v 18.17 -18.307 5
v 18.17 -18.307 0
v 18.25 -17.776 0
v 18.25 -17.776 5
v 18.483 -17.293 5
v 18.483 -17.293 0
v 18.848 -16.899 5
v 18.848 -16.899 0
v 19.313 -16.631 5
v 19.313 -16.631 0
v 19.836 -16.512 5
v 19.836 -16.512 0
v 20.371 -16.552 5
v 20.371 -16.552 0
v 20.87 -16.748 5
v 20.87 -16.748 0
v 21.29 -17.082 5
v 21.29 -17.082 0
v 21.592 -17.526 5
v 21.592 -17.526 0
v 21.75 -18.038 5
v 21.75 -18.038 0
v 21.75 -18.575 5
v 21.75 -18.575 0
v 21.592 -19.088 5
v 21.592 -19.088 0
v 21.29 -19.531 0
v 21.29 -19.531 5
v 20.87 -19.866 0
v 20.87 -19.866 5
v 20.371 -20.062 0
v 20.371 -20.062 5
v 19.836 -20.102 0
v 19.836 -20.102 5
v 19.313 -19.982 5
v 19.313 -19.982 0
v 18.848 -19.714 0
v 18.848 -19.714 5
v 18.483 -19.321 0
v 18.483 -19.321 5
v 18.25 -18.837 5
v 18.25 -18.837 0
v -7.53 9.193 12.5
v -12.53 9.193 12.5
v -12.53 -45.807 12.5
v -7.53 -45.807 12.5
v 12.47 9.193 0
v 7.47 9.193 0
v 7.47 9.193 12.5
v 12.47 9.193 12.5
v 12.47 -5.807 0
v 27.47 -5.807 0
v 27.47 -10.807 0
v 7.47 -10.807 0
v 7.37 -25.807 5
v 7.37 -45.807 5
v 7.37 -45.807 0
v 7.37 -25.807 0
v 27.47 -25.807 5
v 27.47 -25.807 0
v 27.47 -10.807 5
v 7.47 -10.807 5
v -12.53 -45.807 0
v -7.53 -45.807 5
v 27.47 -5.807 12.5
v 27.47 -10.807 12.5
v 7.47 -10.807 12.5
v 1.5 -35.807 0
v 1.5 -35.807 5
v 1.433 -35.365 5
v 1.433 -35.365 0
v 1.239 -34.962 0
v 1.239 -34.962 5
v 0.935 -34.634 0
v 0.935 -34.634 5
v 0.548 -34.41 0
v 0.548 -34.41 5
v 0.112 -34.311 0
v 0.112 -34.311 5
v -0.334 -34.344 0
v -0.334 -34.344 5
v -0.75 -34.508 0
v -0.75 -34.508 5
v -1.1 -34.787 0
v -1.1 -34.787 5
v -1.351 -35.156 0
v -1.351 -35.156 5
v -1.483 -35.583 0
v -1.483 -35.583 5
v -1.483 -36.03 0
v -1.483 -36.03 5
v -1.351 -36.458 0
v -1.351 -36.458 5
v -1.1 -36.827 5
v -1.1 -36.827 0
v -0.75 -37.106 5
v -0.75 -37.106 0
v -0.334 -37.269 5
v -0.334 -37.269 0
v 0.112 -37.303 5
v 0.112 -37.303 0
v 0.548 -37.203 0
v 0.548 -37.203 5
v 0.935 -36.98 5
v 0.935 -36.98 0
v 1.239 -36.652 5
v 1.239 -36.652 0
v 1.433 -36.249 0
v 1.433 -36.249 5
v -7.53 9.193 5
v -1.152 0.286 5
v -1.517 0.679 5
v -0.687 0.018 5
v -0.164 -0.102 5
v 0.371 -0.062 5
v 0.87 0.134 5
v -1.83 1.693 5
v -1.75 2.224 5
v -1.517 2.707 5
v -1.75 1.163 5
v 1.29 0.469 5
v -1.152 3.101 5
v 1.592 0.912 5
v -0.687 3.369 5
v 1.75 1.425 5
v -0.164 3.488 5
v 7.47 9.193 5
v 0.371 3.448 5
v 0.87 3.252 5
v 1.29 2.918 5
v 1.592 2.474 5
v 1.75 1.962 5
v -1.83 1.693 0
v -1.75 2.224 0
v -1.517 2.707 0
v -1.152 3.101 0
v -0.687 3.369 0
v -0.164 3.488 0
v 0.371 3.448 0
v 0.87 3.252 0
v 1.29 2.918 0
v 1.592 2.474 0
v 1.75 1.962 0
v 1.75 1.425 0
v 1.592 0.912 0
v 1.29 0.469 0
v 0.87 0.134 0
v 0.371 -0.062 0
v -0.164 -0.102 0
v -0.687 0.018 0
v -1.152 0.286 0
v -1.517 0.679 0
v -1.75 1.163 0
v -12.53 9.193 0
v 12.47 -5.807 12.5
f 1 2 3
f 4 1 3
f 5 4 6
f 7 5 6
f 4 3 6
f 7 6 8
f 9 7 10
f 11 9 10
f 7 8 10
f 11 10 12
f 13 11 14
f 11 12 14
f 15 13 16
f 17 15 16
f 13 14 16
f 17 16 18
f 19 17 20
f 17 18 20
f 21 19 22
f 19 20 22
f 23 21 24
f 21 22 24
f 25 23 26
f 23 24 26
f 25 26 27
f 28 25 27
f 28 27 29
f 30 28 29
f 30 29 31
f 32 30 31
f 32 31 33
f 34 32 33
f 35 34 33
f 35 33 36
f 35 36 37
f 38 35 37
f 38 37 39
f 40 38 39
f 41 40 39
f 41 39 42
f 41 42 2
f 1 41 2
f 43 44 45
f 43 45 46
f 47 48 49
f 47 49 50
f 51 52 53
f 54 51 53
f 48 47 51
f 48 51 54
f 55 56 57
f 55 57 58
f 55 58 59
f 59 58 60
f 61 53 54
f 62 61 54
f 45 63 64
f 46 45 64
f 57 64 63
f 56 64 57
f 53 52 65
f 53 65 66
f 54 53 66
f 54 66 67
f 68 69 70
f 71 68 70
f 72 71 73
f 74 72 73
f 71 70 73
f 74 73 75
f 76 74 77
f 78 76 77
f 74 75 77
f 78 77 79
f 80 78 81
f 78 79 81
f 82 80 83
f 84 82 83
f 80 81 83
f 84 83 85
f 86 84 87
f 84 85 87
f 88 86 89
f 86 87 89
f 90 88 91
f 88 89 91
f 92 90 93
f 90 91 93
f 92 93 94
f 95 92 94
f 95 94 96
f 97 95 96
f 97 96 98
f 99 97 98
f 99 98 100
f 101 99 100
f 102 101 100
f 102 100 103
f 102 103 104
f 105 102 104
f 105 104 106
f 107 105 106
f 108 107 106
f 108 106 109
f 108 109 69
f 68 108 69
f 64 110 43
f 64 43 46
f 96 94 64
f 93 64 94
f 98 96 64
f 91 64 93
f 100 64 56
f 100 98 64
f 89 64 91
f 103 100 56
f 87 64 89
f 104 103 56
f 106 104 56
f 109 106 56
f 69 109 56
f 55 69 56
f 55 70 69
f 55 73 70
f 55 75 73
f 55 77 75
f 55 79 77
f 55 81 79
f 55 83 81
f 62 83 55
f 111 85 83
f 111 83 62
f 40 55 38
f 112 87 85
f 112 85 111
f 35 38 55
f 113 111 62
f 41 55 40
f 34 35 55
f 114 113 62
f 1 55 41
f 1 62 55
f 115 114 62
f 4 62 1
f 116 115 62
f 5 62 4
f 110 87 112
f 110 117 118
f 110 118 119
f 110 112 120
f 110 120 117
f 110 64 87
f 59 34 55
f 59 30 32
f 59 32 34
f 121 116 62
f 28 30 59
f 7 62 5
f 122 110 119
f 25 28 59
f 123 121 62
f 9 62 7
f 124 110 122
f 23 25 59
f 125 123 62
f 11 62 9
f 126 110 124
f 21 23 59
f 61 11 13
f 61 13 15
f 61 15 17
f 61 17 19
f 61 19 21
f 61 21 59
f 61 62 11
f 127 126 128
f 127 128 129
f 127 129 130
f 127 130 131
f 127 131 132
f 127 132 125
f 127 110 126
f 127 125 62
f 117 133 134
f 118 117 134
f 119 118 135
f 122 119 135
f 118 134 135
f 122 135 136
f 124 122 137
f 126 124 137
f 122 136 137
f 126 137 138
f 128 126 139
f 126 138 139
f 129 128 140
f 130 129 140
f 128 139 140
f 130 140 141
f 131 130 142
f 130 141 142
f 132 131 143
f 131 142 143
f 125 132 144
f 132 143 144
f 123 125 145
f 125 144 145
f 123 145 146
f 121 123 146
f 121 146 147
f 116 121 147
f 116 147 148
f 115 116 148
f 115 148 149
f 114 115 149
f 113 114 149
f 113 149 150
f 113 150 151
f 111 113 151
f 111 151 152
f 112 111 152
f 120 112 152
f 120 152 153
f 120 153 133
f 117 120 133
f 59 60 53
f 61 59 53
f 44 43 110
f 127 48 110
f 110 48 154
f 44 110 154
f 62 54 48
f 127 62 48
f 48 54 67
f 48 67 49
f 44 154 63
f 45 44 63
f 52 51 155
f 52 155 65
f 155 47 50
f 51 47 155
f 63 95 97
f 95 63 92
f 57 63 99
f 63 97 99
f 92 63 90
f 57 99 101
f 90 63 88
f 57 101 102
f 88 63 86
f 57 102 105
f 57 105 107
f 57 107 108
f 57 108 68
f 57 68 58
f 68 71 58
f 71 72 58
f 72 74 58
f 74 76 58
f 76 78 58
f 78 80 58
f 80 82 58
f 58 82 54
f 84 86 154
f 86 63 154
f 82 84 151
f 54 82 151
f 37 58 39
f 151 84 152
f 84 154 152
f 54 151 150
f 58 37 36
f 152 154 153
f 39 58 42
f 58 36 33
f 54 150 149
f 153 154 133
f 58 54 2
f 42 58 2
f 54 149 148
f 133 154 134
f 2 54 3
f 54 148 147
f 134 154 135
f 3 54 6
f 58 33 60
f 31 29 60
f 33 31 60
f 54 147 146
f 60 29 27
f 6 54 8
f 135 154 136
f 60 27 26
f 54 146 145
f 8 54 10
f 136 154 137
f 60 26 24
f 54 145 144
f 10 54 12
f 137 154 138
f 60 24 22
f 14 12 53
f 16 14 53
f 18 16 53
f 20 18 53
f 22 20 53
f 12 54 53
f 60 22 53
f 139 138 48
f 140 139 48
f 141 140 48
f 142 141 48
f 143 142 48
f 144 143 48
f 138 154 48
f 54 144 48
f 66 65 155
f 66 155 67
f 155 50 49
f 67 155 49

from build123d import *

# Parameters (mm, degrees)
BOSS_EXTRUDE1_DEPTH = 5
BOSS_EXTRUDE2_DEPTH = 12.5
BOSS_EXTRUDE3_DEPTH = 12.5
SKETCH4_R           = 1.8
CUT_EXTRUDE1_DEPTH  = 13.5
SKETCH6_W           = 14.9
SKETCH6_H           = 20
BOSS_EXTRUDE4_DEPTH = 5
SKETCH8_R           = 1.5
CUT_EXTRUDE2_DEPTH  = 6


with BuildPart() as part:
    # Sketch1 → Boss-Extrude1 (new body)
    with BuildSketch(Plane.XY):
        Polygon((7.370119522, -25.806772908), (27.470119522, -25.806772908), (27.470119522, -10.806772908), (7.470119522, -10.806772908), (7.470119522, 9.193227092), (-7.529880478, 9.193227092), (-7.529880478, -25.806772908), align=None)
    extrude(amount=BOSS_EXTRUDE1_DEPTH)

    # Sketch4 → Cut-Extrude1 (cut, through all)
    with BuildSketch(Plane(origin=(0, 0, 0), x_dir=(-1, 0, 0), z_dir=(0, 0, -1))):
        with Locations((0.029880478, 1.693227092)):
            Circle(SKETCH4_R)
        with Locations((-19.970119522, -18.306772908)):
            Circle(SKETCH4_R)
    extrude(amount=-CUT_EXTRUDE1_DEPTH, mode=Mode.SUBTRACT)



with BuildPart() as body_2:
    # Sketch2 → Boss-Extrude2 (new body)
    with BuildSketch(Plane(origin=(0, 0, 0), x_dir=(-1, 0, 0), z_dir=(0, 0, -1))):
        Polygon((-7.470119522, 9.193227092), (-12.470119522, 9.193227092), (-12.470119522, -5.806772908), (-27.470119522, -5.806772908), (-27.470119522, -10.806772908), (-7.470119522, -10.806772908), align=None)
    extrude(amount=-BOSS_EXTRUDE2_DEPTH)


with BuildPart() as body_3:
    # Sketch3 → Boss-Extrude3 (new body)
    with BuildSketch(Plane(origin=(0, 0, 0), x_dir=(-1, 0, 0), z_dir=(0, 0, -1))):
        Polygon((7.529880478, 9.193227092), (12.529880478, 9.193227092), (12.529880478, -45.806772908), (7.529880478, -45.806772908), (7.529880478, -25.806772908), align=None)
    extrude(amount=-BOSS_EXTRUDE3_DEPTH)


with BuildPart() as part_1:
    add(part.part)

    add(body_3.part)  # Boss-Extrude4 merges body 3
    # Sketch6 → Boss-Extrude4 (add)
    with BuildSketch(Plane.XY.offset(5)):
        with Locations((-0.079880478, -35.806772908)):
            Rectangle(SKETCH6_W, SKETCH6_H)
    extrude(amount=-BOSS_EXTRUDE4_DEPTH)

    # Sketch8 → Cut-Extrude2 (cut, through all)
    with BuildSketch(Plane.XY.offset(5)):
        with Locations((0, -35.806772908)):
            Circle(SKETCH8_R)
    extrude(amount=-CUT_EXTRUDE2_DEPTH, mode=Mode.SUBTRACT)


solid = Compound([body_2.part, part_1.part])
